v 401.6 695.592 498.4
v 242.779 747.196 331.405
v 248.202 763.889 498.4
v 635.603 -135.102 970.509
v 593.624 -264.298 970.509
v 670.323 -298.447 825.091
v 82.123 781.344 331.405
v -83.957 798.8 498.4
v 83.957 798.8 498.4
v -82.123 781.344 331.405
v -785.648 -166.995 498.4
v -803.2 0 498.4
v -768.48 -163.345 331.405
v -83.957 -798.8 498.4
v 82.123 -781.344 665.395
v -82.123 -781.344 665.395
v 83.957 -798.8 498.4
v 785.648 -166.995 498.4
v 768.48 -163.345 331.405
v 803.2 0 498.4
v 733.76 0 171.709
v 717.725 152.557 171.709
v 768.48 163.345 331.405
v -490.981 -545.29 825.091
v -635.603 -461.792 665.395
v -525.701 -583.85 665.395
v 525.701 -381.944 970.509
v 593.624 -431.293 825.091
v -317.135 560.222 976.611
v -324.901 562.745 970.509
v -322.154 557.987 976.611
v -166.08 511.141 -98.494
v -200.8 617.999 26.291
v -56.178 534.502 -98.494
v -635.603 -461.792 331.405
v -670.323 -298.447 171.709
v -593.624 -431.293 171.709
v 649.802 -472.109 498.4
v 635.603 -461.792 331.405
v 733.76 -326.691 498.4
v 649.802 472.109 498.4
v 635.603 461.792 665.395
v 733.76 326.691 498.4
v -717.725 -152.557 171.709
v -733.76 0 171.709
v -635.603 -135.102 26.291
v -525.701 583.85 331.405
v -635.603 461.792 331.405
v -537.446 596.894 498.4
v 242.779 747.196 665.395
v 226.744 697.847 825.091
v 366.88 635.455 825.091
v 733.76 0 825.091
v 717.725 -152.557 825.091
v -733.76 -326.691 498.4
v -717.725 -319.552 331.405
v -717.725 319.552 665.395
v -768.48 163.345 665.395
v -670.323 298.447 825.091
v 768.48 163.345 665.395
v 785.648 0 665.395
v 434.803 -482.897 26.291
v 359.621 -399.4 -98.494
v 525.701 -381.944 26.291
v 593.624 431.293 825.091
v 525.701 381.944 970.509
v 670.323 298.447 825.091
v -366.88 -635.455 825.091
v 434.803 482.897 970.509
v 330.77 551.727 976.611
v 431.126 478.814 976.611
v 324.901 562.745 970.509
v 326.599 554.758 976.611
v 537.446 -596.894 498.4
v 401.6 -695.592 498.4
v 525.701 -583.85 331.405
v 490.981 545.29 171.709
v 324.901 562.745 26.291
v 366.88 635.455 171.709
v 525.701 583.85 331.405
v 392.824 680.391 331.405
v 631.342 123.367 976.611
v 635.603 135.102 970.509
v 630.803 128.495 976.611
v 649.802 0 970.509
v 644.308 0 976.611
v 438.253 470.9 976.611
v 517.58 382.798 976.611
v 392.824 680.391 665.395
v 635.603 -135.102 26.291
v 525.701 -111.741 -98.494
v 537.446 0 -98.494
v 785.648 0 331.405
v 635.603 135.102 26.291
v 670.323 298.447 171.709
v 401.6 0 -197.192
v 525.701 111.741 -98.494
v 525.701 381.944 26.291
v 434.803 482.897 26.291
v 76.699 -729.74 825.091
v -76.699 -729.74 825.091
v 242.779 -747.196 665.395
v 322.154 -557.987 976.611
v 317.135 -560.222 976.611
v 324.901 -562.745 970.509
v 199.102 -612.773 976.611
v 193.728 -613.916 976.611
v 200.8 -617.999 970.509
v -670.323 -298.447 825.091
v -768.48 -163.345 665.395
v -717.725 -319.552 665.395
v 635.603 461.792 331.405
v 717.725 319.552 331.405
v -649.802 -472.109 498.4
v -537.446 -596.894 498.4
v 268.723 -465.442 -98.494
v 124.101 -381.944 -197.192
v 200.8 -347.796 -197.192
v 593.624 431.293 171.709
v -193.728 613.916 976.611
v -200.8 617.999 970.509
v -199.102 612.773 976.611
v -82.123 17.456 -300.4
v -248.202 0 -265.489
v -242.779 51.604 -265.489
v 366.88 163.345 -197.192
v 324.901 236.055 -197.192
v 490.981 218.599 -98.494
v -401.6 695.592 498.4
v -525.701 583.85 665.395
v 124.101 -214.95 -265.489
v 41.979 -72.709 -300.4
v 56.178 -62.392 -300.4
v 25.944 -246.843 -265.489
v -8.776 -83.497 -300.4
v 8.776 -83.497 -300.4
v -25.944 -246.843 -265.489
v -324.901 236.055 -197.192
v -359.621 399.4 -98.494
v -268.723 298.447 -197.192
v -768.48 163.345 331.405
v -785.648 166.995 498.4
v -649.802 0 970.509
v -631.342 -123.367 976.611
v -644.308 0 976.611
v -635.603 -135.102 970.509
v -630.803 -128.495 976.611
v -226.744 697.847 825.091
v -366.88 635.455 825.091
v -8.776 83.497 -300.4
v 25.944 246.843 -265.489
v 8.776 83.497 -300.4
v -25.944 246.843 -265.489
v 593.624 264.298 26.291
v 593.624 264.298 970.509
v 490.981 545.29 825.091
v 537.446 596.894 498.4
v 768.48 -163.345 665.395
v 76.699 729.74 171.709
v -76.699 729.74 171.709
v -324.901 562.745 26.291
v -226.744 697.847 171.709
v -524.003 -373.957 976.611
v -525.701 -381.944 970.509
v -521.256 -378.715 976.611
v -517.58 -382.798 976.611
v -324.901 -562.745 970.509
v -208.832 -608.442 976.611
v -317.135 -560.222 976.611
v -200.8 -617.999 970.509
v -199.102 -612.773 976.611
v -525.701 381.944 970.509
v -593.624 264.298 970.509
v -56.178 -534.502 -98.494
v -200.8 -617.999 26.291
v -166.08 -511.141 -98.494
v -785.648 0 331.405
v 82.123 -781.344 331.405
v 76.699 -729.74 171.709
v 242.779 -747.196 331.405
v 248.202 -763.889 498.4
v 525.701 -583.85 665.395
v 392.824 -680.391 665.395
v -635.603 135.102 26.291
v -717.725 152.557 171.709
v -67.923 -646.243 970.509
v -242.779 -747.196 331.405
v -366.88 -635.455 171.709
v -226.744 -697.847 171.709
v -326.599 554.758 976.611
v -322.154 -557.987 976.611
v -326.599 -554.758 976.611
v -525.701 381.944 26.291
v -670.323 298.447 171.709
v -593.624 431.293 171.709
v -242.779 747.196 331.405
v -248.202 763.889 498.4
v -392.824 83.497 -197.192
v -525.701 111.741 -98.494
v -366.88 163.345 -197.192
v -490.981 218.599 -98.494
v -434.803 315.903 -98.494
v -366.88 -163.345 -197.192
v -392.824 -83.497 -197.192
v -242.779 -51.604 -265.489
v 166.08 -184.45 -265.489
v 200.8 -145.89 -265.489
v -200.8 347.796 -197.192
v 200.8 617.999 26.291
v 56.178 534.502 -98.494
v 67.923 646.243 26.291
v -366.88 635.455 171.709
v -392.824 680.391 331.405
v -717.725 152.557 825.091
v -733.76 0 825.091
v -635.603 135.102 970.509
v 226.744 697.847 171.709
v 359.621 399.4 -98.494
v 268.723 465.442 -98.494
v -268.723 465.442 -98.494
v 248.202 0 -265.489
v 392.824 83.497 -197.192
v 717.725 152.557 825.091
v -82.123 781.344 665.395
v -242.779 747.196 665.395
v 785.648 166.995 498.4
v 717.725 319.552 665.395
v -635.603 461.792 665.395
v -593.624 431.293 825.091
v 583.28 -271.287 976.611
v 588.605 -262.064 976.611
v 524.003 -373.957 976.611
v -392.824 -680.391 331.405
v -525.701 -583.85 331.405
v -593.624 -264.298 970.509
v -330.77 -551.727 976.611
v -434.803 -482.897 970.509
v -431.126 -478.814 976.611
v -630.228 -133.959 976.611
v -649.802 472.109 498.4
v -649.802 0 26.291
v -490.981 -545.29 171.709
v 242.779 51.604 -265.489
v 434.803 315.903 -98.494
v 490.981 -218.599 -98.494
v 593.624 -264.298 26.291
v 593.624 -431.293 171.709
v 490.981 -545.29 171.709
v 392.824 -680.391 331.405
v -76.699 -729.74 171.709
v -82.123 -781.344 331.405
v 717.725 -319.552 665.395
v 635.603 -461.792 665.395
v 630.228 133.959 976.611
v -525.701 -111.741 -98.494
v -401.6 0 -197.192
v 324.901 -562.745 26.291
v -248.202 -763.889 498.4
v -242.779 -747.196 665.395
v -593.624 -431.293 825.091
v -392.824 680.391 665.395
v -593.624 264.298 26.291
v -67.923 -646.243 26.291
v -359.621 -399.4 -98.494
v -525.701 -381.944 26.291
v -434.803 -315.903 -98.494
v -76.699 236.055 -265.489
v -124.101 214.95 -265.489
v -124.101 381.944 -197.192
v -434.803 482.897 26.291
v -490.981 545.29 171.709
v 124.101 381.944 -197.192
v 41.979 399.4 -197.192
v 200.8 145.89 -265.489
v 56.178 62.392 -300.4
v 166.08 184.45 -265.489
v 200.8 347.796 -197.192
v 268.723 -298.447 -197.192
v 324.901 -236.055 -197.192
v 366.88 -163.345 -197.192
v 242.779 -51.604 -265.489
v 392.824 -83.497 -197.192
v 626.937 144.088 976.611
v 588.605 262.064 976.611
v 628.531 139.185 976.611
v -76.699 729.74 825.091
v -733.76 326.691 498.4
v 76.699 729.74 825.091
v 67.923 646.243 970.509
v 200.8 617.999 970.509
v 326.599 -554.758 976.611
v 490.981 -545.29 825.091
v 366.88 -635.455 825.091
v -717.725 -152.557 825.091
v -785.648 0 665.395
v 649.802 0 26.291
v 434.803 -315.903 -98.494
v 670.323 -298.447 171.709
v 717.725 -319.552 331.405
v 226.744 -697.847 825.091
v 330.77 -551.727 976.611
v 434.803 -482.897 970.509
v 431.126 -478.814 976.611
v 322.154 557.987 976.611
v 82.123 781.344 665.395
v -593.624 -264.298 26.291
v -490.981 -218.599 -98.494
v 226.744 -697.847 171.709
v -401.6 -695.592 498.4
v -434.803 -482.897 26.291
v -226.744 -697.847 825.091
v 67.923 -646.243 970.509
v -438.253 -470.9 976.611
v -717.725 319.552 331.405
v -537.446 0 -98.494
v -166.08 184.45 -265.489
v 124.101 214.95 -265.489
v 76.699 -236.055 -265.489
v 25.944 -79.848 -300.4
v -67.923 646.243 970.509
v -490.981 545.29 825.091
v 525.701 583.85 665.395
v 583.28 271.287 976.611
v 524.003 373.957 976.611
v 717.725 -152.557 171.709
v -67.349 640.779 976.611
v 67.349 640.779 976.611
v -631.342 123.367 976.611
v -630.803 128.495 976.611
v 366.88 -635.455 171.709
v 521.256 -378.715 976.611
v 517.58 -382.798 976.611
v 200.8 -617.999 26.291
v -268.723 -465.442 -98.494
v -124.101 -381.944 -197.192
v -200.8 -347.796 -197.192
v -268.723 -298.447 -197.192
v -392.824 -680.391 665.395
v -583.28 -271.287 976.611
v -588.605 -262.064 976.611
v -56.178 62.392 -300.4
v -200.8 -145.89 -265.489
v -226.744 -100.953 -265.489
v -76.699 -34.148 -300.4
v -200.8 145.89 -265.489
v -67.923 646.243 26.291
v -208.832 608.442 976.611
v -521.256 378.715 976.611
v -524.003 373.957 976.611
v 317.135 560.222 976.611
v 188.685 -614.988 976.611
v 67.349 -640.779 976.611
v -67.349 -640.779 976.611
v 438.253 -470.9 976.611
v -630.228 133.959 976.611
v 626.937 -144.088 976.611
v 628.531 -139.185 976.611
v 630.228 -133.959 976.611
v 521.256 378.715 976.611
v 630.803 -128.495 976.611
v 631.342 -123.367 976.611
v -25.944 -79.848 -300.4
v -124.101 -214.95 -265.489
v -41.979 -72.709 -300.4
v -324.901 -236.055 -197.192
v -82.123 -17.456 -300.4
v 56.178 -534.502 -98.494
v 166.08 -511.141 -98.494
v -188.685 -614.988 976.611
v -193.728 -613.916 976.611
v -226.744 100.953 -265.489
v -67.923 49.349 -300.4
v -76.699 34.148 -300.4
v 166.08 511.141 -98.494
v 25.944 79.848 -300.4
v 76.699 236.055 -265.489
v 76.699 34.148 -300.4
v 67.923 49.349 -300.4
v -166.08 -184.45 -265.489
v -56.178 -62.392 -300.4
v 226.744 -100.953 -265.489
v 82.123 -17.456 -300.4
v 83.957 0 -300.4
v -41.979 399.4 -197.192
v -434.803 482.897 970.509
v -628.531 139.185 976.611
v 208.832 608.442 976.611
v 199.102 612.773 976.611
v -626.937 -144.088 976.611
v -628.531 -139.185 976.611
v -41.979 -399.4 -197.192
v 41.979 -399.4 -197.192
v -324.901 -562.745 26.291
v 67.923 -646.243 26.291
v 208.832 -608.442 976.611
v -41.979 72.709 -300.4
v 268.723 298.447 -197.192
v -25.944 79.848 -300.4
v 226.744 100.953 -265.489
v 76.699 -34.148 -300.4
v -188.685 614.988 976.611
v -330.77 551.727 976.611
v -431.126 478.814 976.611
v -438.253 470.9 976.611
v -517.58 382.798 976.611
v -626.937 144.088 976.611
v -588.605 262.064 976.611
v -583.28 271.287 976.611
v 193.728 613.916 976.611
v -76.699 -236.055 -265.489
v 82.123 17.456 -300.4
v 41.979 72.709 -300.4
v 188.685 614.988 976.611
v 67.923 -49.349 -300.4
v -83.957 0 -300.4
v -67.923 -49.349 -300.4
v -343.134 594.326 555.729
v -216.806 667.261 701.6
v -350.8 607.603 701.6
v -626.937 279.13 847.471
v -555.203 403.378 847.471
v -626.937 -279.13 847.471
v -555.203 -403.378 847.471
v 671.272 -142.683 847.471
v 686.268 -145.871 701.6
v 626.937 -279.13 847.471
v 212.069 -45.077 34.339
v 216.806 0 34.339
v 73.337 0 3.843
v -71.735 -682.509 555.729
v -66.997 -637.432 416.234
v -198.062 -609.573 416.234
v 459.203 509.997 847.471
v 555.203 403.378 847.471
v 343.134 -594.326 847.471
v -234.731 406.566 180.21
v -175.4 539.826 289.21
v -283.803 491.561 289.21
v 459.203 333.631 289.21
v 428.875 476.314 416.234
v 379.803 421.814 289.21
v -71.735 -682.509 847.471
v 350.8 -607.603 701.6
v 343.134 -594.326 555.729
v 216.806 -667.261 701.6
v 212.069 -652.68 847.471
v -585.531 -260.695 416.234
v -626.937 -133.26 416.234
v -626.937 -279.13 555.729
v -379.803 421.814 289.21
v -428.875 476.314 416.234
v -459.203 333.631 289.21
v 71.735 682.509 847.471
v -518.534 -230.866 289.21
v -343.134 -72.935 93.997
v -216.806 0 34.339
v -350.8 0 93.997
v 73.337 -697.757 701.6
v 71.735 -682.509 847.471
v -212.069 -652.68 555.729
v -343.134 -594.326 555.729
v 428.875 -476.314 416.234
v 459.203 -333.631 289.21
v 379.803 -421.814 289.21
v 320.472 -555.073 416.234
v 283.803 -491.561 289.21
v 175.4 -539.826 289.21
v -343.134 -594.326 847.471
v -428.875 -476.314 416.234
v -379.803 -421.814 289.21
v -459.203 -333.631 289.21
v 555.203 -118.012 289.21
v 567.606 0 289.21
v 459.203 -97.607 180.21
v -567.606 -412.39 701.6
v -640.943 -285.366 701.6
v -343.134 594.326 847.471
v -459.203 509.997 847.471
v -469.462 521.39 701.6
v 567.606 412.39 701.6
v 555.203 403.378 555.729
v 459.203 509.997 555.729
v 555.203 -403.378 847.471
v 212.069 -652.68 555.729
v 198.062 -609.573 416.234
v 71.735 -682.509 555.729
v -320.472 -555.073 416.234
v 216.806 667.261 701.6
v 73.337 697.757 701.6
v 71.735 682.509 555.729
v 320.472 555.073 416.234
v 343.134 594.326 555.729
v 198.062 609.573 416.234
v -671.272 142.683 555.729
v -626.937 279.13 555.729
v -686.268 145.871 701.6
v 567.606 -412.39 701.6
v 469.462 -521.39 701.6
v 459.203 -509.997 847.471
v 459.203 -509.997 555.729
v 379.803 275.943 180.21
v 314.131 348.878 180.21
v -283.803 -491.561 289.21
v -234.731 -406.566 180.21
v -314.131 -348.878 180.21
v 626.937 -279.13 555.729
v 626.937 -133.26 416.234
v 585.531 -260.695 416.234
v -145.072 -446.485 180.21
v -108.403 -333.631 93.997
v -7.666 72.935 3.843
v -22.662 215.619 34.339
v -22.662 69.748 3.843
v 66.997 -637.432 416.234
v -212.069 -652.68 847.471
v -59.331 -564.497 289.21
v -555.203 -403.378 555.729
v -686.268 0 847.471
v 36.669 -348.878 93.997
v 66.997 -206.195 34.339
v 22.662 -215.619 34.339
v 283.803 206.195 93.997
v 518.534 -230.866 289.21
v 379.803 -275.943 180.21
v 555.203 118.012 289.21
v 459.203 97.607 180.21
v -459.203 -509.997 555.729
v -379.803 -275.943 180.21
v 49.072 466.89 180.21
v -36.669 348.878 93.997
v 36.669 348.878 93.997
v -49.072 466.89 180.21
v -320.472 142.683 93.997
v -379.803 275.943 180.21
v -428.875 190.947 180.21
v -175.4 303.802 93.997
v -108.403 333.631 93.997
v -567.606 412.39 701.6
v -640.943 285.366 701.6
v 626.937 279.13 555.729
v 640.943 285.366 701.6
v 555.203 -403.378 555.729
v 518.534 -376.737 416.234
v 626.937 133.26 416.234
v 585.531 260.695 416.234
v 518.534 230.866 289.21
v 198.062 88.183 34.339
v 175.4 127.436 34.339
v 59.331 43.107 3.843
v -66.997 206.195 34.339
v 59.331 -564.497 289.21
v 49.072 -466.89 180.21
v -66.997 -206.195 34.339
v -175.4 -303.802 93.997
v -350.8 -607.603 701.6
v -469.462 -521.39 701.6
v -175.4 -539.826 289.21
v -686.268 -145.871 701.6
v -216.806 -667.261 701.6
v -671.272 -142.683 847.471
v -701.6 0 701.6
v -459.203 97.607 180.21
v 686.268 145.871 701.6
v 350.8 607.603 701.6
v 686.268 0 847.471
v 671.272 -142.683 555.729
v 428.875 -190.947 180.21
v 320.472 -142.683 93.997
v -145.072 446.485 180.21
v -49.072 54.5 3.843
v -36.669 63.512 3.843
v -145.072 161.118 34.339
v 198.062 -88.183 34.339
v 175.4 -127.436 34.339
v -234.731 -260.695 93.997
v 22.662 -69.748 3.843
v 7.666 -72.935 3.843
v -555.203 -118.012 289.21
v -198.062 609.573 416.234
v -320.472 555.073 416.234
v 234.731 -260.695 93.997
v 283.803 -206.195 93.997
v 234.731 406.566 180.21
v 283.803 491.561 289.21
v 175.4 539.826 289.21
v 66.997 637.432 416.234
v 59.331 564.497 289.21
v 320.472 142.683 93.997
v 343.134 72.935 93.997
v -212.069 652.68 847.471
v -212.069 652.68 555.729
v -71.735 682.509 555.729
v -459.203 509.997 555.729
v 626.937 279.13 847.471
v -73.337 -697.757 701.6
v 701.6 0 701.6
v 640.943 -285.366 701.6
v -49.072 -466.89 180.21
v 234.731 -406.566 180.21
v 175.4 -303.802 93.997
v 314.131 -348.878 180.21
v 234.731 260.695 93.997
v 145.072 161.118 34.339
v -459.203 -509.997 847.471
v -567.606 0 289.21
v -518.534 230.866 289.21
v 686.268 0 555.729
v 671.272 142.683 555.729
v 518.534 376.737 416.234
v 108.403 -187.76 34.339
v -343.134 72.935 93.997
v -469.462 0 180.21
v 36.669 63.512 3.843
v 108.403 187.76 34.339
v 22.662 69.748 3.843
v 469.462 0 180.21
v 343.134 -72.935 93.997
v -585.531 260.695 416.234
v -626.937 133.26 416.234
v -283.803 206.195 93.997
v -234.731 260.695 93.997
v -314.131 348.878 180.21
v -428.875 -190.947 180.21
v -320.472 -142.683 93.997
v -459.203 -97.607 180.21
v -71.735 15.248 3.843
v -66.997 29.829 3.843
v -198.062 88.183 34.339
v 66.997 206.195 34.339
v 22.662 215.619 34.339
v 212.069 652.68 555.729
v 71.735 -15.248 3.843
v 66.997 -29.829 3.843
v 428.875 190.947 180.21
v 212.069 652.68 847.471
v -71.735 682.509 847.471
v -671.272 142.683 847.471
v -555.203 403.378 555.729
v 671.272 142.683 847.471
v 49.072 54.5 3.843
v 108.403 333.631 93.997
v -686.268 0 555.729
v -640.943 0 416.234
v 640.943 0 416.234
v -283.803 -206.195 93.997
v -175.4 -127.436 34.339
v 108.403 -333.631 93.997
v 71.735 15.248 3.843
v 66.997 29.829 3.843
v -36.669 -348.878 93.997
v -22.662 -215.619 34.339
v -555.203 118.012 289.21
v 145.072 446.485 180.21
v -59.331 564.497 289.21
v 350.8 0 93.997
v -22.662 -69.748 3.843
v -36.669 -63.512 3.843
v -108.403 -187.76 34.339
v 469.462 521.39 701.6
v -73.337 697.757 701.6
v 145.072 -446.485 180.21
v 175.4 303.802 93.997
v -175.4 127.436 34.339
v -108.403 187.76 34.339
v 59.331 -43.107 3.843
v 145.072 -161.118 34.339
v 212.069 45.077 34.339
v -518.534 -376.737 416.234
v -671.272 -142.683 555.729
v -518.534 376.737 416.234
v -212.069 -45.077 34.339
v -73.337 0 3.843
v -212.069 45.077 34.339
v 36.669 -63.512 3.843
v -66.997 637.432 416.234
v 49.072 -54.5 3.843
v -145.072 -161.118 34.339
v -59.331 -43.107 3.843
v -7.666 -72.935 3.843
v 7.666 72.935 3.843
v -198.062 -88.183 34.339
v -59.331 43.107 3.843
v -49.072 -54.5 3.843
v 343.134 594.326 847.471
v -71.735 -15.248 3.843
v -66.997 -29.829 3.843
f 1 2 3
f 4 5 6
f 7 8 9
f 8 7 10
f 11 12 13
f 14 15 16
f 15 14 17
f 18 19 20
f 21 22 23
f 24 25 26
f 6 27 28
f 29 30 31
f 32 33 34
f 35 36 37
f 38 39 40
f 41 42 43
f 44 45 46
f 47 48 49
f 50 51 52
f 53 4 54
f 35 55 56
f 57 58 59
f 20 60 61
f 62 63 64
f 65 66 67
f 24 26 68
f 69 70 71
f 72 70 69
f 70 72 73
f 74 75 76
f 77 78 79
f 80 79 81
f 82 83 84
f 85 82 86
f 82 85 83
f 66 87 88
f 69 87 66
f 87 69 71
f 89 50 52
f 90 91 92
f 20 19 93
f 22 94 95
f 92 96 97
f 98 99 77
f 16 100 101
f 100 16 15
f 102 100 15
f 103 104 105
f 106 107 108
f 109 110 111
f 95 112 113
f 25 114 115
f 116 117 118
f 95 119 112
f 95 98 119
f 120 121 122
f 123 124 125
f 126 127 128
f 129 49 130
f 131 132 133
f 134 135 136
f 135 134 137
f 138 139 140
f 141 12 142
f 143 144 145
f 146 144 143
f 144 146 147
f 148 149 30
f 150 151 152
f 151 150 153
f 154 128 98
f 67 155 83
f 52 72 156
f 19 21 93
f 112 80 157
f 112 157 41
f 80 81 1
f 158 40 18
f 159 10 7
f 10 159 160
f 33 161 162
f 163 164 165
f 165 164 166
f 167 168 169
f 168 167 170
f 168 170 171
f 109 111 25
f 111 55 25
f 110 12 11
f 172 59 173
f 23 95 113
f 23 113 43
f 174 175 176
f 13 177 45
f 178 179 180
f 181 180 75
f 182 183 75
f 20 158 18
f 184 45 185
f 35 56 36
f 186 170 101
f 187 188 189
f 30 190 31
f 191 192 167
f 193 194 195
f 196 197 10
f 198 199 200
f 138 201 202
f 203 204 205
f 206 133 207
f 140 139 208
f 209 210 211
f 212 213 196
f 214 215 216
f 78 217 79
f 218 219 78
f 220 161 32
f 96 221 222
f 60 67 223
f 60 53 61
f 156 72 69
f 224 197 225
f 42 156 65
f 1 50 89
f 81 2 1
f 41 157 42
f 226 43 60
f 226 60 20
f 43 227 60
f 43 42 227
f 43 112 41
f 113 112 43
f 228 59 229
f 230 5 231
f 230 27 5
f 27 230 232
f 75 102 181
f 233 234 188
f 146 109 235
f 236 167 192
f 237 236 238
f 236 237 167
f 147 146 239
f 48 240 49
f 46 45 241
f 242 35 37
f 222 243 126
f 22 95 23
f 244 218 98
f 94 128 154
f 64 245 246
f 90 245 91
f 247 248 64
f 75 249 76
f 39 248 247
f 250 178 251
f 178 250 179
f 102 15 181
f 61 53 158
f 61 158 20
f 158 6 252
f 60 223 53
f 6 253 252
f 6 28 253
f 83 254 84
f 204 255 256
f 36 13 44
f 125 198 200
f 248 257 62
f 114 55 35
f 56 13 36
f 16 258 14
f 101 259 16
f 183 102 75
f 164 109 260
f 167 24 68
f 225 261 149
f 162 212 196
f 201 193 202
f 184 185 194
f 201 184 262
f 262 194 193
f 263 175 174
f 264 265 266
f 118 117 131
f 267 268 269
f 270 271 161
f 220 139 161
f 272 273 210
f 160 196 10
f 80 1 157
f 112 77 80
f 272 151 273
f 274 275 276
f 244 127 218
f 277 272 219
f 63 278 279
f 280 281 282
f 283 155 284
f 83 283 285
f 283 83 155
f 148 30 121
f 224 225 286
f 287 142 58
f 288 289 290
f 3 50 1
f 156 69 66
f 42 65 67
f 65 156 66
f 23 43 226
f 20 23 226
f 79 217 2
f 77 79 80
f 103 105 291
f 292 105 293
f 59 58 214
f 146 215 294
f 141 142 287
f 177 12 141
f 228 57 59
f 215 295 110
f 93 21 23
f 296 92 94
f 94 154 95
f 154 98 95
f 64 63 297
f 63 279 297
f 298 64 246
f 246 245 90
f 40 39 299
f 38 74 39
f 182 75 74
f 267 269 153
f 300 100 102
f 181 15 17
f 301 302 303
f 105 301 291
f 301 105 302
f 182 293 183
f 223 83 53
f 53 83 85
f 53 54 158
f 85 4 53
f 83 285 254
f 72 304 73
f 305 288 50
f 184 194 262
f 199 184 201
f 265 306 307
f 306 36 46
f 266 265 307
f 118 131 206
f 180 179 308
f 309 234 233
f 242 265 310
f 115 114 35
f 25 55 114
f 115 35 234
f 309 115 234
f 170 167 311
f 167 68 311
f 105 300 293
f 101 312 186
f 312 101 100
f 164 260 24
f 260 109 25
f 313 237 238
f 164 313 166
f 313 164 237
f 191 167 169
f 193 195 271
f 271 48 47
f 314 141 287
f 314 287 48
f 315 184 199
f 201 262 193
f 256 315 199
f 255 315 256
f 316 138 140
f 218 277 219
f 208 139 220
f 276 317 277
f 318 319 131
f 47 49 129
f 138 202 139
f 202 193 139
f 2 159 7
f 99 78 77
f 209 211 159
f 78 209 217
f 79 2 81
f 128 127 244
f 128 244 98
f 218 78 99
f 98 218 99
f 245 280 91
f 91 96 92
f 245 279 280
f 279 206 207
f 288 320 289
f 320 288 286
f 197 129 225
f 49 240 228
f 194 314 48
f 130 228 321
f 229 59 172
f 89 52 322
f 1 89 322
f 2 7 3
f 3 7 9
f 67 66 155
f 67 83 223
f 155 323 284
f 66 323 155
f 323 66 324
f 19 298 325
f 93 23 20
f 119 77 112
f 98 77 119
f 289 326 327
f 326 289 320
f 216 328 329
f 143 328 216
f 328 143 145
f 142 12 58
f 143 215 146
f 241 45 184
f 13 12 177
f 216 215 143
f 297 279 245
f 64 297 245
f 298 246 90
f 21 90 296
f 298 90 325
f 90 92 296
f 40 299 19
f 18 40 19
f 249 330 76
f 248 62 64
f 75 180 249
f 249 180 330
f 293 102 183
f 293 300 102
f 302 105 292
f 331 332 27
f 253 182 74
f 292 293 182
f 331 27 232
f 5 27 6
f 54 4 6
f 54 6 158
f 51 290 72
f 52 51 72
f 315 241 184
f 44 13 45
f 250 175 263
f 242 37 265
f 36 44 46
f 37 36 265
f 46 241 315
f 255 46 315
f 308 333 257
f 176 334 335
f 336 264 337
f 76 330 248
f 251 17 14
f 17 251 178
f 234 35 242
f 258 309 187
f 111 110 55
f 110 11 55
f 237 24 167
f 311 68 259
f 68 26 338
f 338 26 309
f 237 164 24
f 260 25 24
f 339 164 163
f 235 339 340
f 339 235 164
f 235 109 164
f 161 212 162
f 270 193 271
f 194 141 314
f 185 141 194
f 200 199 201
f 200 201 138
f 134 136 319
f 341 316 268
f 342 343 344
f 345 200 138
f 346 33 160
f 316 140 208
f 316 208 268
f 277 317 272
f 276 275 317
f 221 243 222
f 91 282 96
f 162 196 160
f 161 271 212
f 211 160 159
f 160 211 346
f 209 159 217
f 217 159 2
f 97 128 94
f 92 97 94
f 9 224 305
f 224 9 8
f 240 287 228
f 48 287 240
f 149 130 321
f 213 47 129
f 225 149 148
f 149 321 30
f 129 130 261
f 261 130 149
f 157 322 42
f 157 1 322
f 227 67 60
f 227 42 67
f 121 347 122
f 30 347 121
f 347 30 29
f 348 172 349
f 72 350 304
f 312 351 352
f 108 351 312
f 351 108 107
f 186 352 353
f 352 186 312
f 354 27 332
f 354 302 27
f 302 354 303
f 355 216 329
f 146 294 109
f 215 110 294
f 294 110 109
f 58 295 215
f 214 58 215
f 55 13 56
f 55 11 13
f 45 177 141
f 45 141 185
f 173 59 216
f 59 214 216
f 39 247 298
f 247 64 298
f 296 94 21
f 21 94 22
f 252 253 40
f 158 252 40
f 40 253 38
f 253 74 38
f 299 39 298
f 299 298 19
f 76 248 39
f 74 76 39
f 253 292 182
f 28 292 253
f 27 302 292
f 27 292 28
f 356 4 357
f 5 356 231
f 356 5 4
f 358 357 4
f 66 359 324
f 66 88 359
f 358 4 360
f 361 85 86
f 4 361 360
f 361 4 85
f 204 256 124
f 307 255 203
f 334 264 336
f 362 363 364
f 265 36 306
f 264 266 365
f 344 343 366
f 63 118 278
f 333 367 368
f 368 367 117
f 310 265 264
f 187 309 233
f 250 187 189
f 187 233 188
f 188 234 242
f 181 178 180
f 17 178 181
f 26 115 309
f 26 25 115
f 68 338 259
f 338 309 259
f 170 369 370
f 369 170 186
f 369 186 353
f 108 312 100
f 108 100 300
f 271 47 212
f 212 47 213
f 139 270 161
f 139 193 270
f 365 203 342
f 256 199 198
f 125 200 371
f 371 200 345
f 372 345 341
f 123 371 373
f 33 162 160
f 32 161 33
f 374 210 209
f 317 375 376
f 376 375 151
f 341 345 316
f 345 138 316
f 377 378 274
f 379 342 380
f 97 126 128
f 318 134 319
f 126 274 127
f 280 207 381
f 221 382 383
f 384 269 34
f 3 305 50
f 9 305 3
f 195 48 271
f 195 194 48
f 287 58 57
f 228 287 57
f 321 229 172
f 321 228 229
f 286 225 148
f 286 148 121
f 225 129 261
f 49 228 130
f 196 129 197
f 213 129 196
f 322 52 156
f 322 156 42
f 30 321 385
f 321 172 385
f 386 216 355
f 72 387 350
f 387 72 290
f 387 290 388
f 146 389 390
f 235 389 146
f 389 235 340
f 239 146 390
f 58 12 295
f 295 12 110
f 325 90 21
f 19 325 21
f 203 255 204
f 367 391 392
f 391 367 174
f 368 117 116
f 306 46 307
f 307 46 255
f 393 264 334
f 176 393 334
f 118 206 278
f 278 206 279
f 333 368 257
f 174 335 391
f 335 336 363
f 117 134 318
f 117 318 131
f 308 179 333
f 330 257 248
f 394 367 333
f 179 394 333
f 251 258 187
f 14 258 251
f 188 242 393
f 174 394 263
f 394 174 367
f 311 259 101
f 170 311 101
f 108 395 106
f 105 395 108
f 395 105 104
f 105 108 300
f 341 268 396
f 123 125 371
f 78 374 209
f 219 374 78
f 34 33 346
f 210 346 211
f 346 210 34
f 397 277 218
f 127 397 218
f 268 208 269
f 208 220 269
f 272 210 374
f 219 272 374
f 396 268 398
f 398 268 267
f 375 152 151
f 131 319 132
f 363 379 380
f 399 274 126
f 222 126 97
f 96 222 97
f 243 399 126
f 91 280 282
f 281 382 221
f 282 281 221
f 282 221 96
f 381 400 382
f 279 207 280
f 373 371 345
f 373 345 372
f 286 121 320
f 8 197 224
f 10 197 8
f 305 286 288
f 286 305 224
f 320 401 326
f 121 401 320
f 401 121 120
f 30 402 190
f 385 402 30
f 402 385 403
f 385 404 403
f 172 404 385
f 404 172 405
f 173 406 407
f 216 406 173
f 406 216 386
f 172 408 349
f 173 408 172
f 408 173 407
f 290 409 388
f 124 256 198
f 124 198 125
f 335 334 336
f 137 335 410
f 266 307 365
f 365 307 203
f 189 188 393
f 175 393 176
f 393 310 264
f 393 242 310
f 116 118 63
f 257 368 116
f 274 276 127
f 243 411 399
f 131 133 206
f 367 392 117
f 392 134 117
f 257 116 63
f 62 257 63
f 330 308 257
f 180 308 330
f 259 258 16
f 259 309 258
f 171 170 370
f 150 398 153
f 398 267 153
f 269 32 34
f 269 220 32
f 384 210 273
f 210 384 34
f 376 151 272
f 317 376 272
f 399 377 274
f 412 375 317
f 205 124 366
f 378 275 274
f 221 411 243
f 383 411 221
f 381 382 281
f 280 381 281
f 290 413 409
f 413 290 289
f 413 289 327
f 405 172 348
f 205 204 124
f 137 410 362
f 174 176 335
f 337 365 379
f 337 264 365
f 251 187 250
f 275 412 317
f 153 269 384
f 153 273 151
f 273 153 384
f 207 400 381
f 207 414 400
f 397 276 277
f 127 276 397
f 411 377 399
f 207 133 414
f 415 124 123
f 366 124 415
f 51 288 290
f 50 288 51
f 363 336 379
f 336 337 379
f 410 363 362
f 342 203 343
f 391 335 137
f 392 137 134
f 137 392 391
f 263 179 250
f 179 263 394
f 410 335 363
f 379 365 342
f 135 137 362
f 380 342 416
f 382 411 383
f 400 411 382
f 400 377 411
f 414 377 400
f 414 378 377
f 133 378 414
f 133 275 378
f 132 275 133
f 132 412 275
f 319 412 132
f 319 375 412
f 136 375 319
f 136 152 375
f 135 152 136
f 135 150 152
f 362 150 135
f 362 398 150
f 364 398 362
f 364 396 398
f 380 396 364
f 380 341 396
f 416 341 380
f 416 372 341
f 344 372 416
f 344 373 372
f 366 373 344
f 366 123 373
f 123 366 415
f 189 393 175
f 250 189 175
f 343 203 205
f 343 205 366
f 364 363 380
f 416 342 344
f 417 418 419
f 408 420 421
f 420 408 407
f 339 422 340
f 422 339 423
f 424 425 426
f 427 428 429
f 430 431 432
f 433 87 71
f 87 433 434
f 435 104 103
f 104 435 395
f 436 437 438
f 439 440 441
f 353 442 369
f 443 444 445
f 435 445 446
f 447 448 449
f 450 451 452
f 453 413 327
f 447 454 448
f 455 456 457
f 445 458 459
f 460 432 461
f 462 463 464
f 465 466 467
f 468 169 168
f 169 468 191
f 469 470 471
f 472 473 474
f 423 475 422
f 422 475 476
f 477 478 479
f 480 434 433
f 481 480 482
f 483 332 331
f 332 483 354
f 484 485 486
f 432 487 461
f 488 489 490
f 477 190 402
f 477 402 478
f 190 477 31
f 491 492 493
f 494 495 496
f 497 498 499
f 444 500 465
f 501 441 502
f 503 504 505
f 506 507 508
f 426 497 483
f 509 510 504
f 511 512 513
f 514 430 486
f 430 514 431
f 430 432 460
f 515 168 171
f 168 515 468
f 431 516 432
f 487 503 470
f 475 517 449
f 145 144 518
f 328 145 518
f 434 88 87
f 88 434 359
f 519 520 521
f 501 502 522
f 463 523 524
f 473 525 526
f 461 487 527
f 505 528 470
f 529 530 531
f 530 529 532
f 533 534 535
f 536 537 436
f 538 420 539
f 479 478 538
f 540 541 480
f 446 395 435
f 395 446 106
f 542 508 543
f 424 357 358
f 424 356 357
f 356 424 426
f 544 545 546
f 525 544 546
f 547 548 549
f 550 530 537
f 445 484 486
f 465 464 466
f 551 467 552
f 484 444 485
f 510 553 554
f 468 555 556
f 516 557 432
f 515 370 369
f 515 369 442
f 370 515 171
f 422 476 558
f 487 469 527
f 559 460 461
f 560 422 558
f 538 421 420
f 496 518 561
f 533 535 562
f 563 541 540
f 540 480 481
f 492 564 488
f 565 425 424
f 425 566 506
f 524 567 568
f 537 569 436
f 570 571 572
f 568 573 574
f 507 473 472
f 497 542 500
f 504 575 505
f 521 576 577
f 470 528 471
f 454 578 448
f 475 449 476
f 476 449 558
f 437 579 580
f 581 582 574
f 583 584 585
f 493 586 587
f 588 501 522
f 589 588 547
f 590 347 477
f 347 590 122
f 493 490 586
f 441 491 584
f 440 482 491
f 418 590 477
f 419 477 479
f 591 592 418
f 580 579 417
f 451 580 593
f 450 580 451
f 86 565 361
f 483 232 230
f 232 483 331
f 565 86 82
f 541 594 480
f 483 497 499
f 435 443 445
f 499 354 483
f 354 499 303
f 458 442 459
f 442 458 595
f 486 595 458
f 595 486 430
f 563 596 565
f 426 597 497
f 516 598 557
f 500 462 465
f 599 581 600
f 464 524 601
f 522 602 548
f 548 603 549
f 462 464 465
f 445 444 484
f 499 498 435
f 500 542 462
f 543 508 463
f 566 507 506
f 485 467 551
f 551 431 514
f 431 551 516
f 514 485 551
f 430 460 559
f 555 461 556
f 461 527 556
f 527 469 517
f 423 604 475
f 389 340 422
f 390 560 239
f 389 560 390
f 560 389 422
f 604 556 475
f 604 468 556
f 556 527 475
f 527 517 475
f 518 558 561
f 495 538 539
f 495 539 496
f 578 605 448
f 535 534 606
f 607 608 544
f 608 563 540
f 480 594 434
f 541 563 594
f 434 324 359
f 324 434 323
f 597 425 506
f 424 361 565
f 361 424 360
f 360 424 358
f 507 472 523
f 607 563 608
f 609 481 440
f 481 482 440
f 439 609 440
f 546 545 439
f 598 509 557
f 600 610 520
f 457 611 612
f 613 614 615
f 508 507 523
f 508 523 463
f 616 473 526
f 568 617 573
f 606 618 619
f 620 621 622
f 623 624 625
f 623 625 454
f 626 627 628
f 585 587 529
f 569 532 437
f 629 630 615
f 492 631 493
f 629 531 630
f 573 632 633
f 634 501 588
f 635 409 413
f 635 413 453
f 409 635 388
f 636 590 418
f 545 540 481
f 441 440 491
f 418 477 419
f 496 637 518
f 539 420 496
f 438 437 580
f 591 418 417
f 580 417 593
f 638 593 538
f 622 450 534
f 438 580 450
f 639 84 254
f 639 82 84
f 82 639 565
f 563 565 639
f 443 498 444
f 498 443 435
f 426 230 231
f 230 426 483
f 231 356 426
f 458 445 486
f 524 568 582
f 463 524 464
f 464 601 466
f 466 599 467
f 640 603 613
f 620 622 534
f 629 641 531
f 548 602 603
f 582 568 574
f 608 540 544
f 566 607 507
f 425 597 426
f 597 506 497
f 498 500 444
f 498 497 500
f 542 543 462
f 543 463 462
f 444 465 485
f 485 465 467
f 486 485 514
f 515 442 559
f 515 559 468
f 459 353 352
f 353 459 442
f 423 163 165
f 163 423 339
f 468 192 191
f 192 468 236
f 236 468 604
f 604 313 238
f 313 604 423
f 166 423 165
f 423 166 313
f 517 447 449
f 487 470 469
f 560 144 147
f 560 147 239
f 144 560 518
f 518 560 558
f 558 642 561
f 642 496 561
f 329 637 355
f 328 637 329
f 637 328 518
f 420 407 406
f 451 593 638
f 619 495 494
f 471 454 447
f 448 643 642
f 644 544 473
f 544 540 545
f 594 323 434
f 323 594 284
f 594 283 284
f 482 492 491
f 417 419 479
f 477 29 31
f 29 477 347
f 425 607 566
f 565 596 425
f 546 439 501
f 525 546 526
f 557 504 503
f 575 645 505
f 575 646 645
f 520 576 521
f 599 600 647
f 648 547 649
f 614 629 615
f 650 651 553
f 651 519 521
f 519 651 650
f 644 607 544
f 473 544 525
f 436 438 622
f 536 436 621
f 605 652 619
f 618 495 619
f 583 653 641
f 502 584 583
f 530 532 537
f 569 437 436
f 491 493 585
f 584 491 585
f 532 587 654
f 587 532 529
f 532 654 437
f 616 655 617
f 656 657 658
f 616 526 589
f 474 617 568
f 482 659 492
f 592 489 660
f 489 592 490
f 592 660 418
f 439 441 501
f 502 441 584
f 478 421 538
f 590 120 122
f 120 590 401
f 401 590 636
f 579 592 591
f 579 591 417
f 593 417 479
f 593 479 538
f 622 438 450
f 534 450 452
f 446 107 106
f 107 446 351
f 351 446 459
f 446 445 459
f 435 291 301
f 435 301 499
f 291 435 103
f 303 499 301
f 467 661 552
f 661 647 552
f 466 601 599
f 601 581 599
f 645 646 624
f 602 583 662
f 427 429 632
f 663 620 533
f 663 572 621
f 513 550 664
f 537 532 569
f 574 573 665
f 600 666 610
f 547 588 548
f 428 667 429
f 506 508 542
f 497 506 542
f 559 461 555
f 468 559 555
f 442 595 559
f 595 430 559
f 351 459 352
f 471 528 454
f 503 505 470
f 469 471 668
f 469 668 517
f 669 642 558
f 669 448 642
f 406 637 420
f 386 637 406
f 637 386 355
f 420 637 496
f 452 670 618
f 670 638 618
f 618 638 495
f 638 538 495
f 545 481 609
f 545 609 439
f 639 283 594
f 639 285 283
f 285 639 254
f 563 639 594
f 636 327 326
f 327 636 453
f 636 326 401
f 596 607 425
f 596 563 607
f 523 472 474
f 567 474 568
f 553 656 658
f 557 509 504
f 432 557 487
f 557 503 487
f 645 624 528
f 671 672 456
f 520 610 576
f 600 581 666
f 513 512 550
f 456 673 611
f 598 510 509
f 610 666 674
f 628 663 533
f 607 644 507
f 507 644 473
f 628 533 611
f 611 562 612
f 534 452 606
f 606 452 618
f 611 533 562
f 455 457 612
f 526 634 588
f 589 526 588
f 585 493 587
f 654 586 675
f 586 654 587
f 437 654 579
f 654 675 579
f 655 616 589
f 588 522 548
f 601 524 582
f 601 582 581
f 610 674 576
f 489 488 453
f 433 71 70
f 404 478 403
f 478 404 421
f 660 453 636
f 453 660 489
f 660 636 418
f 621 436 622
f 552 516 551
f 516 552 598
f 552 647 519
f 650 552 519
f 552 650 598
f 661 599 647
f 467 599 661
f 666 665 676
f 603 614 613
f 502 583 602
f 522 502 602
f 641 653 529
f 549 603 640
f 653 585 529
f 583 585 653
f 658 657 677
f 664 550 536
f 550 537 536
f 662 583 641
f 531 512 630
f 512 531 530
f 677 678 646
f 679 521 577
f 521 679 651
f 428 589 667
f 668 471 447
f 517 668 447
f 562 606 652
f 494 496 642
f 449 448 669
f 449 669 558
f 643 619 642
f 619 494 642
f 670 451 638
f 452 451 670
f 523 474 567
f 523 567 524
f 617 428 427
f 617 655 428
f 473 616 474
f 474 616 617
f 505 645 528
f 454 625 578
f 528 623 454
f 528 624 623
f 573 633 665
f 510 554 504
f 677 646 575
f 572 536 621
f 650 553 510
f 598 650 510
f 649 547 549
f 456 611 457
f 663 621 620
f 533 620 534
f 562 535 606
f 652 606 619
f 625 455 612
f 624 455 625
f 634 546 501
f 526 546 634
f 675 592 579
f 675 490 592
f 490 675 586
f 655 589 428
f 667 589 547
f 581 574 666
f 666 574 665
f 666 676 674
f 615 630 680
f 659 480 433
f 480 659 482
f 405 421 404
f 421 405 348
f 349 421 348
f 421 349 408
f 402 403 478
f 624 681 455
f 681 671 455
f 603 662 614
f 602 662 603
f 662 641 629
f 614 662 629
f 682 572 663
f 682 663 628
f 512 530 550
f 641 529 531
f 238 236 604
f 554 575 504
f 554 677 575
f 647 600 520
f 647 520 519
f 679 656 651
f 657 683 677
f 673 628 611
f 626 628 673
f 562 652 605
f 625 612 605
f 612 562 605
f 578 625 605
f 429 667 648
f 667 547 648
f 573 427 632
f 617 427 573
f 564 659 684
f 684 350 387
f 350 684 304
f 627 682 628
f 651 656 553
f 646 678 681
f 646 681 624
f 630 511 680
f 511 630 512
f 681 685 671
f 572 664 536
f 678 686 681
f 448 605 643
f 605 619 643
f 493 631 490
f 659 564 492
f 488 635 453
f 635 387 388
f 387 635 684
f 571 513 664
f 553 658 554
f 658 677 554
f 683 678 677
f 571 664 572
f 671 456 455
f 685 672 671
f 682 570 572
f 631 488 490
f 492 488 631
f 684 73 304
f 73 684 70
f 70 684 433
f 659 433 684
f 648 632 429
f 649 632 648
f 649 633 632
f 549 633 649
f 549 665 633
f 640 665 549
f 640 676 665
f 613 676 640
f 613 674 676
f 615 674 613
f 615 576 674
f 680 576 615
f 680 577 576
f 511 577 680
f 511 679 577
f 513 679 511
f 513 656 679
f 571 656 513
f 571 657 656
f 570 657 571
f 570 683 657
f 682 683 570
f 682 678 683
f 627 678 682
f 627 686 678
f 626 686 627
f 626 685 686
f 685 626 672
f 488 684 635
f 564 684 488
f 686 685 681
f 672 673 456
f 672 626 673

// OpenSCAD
ball=1200;

in=25.4;

base_h=12*in;

wall=8*in;
walll=wall*2;

wood=0.5*in;

dent=base_h-wood*2;

pad=0.1;
padd=pad*2;

splines=6;
spline_delta=360/splines;


module top_slice() {
    projection(cut=true)
    translate([0,0,ball/2+wall-base_h])
    sphere(d=ball+walll);
}

module keys() {
    difference() {
        translate([0,0,ball/2+wall-base_h])
        sphere(d=ball+walll);
        translate([0,0,ball/2+wall/2])
        sphere(d=ball+wall);
    }
}
keys();

module positive() {
    difference() {
        linear_extrude(height=base_h)
        top_slice();
        translate([0,0,ball/2])
        sphere(d=ball);
    }
}

module dent() {
    minkowski() {
        sphere(d=dent);
        linear_extrude(height=pad)
        difference() {
            circle(d=ball+wall);
            top_slice();
        }
    }
}


module top_2d() {
    projection(cut=true)
    difference() {
        translate([0,0,-base_h+pad])
        positive();
        intersection() {
            translate([0,0,-pad])
            spline_3d();
            translate([0,0,(ball+wall)/2-base_h])
            sphere(d=ball+wall);
        }
    }
}

module top_3d() {
    translate([0,0,base_h-wood])
    linear_extrude(height=wood)
    top_2d();
}

module bottom_2d() {
    top_slice();
}

module bottom_3d() {
    translate([0,0,-wood])
    linear_extrude(height=wood)
    bottom_2d();
}

module spline_2d() {
    projection(cut=true)
    rotate([90,0,0])
    difference() {
        positive();
        translate([0,-ball/2-wall,-pad])
        cube([ball+wall,ball+wall,base_h+padd]);
    }
}

module spline_3d() {
    for(angle=[0:spline_delta:360]) {
        rotate([0,0,angle])
        rotate([-90,0,0])
        translate([0,0,-wood/2])
        linear_extrude(height=wood)
        spline_2d();
    }
}


module assembly() {
    color("cyan")
    top_3d();
    color("cyan")
    bottom_3d();
    spline_3d();
}

//assembly();
